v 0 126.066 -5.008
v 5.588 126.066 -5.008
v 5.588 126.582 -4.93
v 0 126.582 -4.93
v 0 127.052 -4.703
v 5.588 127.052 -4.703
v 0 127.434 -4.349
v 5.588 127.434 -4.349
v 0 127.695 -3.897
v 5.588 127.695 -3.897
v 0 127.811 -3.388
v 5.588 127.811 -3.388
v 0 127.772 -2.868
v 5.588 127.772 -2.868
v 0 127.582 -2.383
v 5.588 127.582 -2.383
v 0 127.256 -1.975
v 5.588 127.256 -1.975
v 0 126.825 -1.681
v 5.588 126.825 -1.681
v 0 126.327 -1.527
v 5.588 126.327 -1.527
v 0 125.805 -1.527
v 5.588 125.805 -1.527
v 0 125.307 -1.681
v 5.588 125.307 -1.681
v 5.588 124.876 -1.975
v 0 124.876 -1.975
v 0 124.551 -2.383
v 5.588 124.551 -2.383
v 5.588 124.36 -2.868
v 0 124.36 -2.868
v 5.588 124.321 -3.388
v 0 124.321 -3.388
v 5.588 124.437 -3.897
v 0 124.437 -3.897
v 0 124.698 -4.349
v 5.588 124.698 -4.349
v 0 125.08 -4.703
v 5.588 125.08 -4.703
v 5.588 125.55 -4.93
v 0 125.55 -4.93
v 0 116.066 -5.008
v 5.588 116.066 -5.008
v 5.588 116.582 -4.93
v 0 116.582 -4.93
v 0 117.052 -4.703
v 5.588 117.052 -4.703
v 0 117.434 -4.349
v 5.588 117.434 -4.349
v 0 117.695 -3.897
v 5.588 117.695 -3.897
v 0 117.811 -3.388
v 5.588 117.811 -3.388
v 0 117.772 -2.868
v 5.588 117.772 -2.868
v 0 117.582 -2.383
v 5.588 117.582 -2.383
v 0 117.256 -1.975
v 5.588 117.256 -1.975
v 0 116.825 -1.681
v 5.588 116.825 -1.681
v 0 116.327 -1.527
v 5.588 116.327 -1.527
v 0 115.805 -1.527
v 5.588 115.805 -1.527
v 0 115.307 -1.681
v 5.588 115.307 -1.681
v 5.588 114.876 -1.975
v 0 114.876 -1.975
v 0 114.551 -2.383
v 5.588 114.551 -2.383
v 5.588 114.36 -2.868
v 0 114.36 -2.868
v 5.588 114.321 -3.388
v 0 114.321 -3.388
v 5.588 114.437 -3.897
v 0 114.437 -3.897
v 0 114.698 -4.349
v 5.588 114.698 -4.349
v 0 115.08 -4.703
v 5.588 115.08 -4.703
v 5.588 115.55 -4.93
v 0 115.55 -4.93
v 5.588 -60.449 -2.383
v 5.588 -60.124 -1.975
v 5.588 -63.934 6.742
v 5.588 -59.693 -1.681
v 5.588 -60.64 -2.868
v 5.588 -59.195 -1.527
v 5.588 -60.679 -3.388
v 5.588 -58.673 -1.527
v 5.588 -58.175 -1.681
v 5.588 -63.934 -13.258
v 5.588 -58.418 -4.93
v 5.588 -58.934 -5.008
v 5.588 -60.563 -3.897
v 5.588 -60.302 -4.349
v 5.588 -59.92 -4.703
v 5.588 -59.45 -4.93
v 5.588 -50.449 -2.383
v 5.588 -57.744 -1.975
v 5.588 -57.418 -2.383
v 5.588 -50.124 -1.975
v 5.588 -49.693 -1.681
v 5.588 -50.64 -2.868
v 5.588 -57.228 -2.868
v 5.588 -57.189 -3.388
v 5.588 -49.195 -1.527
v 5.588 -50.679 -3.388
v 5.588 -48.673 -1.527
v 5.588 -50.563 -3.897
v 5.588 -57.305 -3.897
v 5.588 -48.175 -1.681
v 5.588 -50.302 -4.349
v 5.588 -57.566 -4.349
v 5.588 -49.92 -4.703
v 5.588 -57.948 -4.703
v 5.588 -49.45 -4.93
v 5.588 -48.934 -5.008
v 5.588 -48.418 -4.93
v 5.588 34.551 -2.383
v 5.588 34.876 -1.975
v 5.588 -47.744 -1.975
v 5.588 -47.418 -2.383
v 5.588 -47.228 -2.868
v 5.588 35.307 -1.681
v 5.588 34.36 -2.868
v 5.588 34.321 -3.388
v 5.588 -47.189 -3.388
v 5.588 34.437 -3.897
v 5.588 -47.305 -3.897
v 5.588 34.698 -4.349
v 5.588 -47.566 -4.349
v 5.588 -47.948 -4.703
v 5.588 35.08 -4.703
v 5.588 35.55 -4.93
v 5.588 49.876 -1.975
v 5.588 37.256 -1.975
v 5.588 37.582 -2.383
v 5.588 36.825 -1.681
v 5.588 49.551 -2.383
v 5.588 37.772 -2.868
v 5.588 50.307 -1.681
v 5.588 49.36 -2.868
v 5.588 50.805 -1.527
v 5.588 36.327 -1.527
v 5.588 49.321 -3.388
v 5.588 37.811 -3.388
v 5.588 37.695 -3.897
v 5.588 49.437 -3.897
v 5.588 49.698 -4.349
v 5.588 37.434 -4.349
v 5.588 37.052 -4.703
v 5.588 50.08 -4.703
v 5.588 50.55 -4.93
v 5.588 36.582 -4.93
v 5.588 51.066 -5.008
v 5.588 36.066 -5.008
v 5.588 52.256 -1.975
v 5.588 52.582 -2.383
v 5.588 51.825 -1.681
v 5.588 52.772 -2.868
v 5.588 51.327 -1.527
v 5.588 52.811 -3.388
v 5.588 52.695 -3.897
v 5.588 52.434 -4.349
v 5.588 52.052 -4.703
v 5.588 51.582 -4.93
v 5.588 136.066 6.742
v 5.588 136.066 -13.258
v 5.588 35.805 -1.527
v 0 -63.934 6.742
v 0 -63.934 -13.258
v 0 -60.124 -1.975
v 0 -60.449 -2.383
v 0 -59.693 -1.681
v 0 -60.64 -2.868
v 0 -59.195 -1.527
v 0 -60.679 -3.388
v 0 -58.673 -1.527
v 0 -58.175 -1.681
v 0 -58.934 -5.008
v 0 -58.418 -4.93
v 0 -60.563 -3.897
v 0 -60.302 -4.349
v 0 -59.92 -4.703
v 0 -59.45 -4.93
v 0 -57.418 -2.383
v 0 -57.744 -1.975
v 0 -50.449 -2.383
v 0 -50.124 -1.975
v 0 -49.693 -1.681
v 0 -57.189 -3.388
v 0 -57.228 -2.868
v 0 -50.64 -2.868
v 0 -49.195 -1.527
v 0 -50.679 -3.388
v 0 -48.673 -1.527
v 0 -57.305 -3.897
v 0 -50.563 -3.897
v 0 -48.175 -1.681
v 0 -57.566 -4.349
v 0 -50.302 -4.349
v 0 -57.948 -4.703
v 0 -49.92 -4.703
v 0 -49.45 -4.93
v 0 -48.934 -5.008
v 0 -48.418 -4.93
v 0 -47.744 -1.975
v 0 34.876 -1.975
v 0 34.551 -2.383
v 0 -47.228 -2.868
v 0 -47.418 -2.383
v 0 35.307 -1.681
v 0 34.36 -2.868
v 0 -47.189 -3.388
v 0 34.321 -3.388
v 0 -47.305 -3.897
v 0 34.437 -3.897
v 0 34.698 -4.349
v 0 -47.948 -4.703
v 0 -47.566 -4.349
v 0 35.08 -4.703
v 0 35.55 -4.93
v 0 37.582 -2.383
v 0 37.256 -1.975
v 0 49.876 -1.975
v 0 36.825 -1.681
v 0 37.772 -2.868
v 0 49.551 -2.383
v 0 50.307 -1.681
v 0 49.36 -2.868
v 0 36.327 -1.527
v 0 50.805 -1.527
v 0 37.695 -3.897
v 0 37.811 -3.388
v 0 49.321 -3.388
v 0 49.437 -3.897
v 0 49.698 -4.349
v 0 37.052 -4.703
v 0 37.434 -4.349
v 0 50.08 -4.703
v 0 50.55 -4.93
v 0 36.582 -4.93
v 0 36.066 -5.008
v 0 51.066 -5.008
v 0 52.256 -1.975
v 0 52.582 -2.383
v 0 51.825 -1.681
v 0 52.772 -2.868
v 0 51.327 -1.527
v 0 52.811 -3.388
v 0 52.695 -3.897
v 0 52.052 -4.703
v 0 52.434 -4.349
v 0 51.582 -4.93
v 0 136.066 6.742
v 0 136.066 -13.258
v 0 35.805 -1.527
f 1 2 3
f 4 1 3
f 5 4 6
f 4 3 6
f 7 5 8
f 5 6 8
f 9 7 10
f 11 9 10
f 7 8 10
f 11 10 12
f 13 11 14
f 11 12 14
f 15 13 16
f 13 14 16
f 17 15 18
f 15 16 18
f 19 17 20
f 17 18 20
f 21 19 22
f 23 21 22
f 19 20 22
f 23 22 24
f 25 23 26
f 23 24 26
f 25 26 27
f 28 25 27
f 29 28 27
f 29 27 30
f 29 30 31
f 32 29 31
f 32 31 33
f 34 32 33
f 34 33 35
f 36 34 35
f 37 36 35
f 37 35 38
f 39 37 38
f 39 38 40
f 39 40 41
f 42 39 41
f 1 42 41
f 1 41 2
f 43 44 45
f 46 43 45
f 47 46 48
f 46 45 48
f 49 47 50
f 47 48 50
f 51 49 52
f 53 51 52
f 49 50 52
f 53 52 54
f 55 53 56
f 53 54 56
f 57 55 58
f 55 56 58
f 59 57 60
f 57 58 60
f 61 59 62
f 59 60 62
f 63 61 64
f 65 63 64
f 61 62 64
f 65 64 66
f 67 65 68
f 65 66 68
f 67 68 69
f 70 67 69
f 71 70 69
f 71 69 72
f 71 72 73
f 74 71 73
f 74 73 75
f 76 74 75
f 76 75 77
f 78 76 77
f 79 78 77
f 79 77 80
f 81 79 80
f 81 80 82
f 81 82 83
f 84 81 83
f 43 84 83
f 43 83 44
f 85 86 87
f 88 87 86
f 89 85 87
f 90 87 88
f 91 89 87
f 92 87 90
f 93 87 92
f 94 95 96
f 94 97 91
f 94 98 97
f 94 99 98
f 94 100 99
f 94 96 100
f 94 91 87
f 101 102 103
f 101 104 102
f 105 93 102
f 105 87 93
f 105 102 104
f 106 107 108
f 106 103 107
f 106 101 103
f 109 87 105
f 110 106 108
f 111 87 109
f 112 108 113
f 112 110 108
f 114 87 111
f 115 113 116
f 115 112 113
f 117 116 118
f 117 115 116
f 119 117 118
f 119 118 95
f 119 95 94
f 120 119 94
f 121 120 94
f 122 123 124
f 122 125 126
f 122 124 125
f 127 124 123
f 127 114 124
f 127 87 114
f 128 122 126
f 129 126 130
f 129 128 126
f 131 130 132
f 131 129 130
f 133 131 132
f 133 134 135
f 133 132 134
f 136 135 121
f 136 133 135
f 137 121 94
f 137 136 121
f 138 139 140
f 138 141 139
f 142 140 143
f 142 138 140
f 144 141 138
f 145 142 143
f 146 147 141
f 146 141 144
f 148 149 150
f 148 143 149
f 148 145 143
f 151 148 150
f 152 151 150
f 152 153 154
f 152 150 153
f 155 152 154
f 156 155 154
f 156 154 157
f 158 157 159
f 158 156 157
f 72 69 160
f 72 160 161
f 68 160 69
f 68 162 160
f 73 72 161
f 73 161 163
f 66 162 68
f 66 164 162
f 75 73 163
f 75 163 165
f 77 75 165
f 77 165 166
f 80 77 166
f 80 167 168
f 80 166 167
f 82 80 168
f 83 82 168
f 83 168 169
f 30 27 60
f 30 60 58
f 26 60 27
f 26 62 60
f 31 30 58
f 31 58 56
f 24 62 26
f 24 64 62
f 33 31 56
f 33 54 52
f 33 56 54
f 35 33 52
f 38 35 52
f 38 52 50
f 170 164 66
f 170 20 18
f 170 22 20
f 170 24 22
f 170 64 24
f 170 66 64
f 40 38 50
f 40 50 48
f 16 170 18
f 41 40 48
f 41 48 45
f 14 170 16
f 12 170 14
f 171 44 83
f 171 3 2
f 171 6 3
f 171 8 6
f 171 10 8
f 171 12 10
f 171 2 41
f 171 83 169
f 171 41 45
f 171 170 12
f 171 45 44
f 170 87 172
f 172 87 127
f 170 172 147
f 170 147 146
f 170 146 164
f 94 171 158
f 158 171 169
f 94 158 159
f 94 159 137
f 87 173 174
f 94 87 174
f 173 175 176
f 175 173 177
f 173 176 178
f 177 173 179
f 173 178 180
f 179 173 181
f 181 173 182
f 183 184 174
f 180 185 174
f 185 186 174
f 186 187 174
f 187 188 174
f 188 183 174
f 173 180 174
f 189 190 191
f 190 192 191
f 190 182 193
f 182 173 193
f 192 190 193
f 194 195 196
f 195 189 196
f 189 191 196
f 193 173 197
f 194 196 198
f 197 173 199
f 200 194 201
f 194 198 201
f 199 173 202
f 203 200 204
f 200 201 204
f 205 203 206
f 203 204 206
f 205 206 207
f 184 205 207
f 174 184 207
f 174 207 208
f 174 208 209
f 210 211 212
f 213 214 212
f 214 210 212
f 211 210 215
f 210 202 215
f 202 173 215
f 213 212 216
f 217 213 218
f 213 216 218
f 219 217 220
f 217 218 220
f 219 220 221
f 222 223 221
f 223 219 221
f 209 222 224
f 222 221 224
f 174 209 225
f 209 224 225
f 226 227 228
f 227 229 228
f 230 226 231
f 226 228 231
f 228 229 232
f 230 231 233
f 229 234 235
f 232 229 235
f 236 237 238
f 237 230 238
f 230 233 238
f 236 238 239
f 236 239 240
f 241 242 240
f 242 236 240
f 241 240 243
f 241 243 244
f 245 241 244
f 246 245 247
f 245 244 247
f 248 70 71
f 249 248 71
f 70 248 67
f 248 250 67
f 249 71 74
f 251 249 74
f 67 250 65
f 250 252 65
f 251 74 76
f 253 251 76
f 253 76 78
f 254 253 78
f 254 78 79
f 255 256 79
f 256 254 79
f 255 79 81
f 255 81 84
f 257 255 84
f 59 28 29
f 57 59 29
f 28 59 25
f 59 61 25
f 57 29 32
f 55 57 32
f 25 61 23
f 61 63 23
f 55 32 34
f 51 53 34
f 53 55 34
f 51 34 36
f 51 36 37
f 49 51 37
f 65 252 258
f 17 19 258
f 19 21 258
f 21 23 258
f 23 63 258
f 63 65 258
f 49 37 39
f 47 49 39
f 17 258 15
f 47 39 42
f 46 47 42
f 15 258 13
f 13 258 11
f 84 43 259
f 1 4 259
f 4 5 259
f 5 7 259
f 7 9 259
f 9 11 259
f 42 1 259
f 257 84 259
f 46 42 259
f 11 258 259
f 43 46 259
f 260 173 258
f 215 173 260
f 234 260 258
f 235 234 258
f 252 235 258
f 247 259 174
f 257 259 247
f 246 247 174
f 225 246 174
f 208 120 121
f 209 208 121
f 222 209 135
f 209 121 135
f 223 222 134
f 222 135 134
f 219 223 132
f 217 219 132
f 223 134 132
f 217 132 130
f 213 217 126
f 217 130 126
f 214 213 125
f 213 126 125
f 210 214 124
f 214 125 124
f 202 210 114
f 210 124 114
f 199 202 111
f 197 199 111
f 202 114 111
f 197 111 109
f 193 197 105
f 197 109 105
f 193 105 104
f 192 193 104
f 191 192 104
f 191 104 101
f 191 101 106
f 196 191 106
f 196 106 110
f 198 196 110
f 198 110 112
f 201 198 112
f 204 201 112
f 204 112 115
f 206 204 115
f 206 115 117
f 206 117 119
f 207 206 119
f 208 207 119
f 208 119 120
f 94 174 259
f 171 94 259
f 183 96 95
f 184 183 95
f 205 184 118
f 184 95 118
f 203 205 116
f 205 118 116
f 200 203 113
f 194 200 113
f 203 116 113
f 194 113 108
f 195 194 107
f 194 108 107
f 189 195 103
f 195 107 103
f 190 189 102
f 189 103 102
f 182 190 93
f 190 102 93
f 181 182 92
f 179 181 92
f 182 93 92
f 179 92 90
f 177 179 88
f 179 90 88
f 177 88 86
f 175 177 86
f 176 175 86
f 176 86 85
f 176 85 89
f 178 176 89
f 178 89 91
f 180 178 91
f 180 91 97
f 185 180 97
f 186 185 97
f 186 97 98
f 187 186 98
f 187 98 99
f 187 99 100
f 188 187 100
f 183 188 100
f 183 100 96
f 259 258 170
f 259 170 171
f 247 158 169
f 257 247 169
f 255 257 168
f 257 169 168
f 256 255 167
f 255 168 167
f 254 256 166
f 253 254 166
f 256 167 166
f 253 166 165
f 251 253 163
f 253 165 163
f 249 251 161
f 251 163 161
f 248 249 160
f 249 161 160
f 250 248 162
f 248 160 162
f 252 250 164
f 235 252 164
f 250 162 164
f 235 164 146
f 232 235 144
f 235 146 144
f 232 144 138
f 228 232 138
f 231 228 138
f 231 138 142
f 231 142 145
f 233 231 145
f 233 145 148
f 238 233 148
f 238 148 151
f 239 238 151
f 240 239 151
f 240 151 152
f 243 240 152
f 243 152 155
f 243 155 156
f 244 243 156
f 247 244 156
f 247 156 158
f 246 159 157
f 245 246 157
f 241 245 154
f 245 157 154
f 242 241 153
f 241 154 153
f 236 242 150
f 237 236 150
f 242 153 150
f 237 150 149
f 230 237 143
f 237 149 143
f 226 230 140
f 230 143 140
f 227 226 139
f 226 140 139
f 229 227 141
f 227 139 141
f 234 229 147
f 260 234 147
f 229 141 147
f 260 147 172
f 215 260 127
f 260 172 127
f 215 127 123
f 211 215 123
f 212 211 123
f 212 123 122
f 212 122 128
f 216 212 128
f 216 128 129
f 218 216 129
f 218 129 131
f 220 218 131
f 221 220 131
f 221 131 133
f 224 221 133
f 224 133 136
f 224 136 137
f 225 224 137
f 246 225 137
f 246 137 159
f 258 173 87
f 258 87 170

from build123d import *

# Parameters (mm, degrees)
SKETCH1_W           = 20
SKETCH1_H           = 200
BOSS_EXTRUDE1_DEPTH = 5.588
SKETCH2_R           = 1.75
CUT_EXTRUDE1_DEPTH  = 137.824655756
SKETCH3_R           = 1.75
CUT_EXTRUDE2_DEPTH  = 137.824655756


with BuildPart() as part:
    # Sketch1 → Boss-Extrude1 (new body)
    with BuildSketch(Plane(origin=(0, 0, 0), x_dir=(0, 0, -1), z_dir=(1, 0, 0))):
        with Locations((3.257579928, 36.066150284)):
            Rectangle(SKETCH1_W, SKETCH1_H)
    extrude(amount=BOSS_EXTRUDE1_DEPTH)

    # Sketch2 → Cut-Extrude1 (cut, through all)
    with BuildSketch(Plane(origin=(5.588, 0, 0), x_dir=(0, 0, -1), z_dir=(1, 0, 0))):
        with Locations((3.257579928, -58.933849716)):
            Circle(SKETCH2_R)
        with Locations((3.257579928, -48.933849716)):
            Circle(SKETCH2_R)
        with Locations((3.257579928, 116.066150284)):
            Circle(SKETCH2_R)
        with Locations((3.257579928, 126.066150284)):
            Circle(SKETCH2_R)
    extrude(amount=-CUT_EXTRUDE1_DEPTH, mode=Mode.SUBTRACT)

    # Sketch3 → Cut-Extrude2 (cut, through all)
    with BuildSketch(Plane(origin=(5.588, 0, 0), x_dir=(0, 0, -1), z_dir=(1, 0, 0))):
        with Locations((3.257579928, 36.066150284)):
            Circle(SKETCH3_R)
        with Locations((3.257579928, 51.066150284)):
            Circle(SKETCH3_R)
    extrude(amount=-CUT_EXTRUDE2_DEPTH, mode=Mode.SUBTRACT)


solid = part.part
